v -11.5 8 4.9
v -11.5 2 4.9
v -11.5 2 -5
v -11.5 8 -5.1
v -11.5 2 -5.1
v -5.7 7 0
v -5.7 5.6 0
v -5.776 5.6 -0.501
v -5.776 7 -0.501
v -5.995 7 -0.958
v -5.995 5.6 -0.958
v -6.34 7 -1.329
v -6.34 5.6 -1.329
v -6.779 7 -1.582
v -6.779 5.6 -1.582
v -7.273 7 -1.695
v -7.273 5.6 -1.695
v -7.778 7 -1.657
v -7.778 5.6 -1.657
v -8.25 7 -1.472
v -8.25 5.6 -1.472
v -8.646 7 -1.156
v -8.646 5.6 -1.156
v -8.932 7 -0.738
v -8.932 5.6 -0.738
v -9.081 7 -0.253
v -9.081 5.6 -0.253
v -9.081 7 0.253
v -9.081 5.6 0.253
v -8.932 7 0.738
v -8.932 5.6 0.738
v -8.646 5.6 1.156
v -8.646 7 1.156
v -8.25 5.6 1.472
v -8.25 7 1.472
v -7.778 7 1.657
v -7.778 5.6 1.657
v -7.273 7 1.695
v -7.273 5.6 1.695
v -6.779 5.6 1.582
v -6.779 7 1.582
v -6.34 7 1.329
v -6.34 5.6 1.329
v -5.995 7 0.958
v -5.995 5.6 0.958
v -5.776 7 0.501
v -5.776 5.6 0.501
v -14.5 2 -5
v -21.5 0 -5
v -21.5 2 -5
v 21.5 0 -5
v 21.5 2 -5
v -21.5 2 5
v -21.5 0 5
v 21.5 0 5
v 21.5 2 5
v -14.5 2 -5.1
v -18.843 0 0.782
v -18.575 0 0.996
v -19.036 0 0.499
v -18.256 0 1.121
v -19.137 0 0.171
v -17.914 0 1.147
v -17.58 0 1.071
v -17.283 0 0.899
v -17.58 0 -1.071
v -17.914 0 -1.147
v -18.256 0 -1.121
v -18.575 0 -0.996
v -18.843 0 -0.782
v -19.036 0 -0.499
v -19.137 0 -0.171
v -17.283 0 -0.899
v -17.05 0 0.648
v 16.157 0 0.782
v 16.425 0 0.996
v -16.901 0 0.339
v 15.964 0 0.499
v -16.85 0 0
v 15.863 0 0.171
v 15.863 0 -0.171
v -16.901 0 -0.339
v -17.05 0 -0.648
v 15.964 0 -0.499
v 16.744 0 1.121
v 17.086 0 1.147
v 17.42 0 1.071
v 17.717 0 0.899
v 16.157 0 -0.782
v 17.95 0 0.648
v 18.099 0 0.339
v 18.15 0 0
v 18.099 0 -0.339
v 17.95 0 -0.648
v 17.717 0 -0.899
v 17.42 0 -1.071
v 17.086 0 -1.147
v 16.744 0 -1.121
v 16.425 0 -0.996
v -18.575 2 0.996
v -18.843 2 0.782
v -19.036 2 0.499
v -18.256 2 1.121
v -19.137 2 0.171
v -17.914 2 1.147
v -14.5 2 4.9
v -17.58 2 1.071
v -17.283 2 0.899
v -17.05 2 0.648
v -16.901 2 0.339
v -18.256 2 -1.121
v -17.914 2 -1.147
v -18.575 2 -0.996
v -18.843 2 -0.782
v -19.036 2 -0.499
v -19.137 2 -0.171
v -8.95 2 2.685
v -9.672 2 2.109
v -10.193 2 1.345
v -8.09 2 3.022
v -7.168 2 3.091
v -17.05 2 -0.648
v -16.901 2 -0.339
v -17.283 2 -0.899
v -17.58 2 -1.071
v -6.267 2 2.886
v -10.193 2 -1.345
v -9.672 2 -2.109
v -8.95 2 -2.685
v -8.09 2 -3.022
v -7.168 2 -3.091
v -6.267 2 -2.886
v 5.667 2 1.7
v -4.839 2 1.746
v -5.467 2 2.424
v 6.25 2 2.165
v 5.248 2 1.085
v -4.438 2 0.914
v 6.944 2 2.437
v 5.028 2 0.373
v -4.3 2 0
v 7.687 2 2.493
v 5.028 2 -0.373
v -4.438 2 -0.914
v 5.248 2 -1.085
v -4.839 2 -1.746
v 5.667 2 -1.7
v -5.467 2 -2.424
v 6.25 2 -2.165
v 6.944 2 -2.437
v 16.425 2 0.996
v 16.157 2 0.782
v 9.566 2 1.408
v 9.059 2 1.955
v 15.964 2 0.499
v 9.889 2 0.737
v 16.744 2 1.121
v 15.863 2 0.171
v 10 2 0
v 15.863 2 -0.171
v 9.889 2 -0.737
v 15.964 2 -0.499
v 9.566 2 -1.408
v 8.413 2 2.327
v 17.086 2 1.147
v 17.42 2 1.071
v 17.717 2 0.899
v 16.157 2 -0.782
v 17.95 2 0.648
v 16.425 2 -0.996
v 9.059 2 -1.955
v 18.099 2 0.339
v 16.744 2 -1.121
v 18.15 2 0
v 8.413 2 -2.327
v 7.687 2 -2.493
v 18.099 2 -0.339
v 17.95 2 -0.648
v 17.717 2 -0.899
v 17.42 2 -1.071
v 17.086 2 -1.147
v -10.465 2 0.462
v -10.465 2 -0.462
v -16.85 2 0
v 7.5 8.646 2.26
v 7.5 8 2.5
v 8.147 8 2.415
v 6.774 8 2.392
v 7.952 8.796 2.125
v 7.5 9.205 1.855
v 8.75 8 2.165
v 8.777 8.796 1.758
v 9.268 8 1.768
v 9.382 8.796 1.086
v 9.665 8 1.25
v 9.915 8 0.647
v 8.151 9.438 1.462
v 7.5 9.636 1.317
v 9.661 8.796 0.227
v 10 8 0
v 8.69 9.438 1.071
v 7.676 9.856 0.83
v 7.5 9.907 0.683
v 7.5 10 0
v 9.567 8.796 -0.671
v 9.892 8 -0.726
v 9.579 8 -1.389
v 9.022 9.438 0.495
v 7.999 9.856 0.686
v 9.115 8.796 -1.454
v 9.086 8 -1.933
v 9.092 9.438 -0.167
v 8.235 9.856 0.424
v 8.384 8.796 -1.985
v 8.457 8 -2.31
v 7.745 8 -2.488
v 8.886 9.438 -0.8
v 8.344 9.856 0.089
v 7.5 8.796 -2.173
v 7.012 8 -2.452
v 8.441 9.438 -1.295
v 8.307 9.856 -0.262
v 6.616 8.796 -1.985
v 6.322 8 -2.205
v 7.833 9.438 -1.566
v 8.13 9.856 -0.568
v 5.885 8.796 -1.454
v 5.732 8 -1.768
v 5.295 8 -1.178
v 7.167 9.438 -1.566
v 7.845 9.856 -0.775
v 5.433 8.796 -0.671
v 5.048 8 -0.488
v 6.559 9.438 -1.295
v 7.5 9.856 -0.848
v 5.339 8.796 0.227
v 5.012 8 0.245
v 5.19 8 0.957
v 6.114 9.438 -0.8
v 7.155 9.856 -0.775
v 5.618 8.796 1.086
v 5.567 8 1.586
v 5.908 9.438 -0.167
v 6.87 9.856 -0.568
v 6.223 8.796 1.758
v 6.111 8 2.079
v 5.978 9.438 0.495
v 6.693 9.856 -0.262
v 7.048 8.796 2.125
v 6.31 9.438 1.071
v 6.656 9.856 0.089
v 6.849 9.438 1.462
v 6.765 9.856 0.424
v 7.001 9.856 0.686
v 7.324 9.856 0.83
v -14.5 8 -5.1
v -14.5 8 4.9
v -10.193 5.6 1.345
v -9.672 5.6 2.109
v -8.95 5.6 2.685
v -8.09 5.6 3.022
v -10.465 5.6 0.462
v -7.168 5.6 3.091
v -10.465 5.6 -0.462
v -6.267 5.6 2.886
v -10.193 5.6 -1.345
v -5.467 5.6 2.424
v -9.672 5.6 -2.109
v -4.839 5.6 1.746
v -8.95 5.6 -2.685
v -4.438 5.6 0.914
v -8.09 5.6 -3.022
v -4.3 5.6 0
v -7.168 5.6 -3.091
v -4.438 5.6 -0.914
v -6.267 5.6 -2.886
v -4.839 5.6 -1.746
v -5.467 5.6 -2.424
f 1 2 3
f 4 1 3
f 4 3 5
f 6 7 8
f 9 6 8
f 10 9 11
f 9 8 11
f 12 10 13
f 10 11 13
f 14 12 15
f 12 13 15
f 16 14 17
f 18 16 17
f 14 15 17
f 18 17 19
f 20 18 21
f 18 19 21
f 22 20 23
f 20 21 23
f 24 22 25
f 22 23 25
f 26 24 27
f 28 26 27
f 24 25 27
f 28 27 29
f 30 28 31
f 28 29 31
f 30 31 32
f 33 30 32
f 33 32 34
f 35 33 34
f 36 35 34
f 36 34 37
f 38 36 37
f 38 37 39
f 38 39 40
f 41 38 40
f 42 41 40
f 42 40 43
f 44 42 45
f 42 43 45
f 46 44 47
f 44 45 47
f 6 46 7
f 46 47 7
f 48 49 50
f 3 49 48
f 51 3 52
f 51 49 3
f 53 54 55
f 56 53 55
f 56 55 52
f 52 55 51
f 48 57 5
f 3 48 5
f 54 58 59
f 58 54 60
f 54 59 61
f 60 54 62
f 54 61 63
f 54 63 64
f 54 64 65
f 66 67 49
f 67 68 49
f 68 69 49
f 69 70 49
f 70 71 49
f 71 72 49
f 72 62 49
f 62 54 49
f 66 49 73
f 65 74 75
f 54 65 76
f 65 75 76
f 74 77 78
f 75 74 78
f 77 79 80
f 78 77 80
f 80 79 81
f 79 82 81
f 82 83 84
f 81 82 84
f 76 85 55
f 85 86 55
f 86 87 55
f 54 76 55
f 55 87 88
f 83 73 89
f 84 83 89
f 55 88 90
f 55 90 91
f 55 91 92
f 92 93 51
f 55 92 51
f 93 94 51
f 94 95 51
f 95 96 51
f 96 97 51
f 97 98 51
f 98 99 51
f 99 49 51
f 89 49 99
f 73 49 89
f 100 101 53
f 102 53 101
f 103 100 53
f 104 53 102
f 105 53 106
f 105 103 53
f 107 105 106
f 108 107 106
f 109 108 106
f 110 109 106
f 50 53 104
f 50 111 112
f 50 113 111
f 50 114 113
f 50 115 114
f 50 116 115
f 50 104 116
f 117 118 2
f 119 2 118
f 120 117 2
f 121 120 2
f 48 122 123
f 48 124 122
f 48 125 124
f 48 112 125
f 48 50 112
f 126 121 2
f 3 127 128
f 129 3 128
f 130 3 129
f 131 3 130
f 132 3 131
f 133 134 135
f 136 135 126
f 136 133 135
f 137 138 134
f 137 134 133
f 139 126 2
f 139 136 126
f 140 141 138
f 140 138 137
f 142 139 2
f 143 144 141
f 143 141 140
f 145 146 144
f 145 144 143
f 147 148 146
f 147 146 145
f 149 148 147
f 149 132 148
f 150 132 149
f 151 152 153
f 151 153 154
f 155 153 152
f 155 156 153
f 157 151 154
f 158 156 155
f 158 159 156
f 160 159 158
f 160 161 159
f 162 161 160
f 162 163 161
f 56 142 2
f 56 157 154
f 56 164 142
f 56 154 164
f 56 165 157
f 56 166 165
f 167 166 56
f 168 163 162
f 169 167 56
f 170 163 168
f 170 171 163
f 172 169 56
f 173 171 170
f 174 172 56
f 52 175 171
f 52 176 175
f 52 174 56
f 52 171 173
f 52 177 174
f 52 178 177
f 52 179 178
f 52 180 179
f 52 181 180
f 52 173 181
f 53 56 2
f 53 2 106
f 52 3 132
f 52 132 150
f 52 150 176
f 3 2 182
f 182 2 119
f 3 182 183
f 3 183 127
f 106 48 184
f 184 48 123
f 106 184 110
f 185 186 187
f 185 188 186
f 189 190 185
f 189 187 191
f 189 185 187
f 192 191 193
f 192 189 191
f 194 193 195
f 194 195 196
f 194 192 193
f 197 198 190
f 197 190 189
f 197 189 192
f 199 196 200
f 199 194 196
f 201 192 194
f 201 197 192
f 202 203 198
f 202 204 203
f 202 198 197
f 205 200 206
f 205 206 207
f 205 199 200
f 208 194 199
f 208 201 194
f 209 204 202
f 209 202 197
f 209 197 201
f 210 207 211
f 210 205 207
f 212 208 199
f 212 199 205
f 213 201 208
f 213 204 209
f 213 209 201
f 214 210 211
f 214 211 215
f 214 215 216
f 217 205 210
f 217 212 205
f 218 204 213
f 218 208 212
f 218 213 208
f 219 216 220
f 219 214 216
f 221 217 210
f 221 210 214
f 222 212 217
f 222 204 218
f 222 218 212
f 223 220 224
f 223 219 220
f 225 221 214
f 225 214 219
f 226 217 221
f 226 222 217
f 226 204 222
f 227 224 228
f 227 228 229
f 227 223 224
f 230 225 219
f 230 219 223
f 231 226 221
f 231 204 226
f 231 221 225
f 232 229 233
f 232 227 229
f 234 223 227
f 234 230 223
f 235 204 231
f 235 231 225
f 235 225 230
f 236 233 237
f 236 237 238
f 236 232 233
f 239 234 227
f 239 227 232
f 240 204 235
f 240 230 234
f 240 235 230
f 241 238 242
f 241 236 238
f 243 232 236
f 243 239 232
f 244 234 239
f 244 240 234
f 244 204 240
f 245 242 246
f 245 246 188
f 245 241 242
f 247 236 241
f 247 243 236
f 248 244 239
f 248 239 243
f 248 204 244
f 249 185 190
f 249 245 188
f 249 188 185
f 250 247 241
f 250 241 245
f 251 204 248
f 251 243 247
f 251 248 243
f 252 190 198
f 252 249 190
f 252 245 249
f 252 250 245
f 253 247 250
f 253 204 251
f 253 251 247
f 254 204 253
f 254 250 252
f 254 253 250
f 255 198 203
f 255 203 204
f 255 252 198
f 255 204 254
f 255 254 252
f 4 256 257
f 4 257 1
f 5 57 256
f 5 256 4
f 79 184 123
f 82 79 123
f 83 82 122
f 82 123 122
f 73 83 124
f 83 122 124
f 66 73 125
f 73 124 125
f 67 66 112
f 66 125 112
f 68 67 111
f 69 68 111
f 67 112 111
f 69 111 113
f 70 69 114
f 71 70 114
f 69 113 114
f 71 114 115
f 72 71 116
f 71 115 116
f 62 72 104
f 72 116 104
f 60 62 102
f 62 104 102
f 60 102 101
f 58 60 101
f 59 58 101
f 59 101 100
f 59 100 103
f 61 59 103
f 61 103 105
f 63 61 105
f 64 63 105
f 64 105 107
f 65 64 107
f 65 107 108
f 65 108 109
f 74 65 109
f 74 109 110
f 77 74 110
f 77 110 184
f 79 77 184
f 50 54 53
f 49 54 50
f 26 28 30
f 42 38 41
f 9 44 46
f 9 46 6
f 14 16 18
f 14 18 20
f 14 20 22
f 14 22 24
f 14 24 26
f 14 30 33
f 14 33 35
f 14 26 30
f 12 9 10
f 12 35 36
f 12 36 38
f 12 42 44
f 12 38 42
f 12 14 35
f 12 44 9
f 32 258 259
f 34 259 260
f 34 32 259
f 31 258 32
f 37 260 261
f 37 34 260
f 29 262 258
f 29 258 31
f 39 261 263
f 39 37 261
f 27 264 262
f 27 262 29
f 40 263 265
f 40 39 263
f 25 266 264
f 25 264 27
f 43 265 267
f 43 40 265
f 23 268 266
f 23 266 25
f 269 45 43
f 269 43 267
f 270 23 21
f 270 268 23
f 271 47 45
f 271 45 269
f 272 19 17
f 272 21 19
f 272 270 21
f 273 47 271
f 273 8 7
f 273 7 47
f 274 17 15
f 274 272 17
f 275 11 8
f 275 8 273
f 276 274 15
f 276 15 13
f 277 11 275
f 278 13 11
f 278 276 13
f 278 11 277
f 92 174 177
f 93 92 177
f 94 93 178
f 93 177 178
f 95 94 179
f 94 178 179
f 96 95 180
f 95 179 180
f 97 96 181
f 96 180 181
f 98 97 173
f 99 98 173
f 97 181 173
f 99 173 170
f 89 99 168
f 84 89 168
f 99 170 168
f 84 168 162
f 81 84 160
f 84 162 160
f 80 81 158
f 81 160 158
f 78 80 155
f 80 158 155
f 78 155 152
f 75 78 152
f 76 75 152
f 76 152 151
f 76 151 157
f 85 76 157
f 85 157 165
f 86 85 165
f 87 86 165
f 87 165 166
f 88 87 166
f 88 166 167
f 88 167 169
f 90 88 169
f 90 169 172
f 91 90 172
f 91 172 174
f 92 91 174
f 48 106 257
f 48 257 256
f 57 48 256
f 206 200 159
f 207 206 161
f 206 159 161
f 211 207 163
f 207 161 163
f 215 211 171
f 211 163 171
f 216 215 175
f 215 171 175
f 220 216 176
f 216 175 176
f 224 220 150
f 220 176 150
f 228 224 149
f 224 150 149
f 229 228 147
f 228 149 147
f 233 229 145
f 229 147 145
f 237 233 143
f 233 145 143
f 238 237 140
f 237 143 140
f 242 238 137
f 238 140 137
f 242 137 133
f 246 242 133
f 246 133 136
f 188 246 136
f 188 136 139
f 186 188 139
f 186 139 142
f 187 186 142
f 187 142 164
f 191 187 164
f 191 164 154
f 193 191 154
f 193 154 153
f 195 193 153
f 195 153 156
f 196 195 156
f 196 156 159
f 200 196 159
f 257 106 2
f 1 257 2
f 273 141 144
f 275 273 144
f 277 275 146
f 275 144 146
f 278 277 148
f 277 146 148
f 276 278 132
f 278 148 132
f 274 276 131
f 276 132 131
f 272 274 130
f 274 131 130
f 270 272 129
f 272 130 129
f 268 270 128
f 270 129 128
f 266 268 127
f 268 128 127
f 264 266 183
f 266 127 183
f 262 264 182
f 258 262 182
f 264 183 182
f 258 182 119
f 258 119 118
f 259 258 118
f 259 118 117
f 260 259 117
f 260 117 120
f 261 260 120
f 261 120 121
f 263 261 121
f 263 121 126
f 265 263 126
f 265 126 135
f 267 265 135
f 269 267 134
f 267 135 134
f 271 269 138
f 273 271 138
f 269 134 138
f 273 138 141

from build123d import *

# Parameters (mm, degrees)
SKETCH1_W               = 43
SKETCH1_H               = 10
BOSS_EXTRUDE1_DEPTH     = 2
SKETCH2_W               = 3
SKETCH2_H               = 10
BOSS_EXTRUDE2_DEPTH     = 6
SKETCH4_R               = 3.1
BOSS_EXTRUDE3_DEPTH     = 3.6
SKETCH6_R               = 1.7
BOSS_EXTRUDE5_DEPTH     = 1.4
SKETCH7_R               = 2.5
BOSS_EXTRUDE6_DEPTH     = 6
DOME1_FACE_RADIUS       = 2.5
DOME1_HEIGHT            = 2
SKETCH8_R               = 1.15
CUT_EXTRUDE1_DEPTH      = 9
CUT_EXTRUDE1_DEPTH_BACK = 3


with BuildPart() as part:
    # Sketch1 → Boss-Extrude1 (new body)
    with BuildSketch(Plane(origin=(0, 0, 0), x_dir=(1, 0, 0), z_dir=(0, 1, 0))):
        Rectangle(SKETCH1_W, SKETCH1_H)
    extrude(amount=BOSS_EXTRUDE1_DEPTH)

    # Sketch2 → Boss-Extrude2 (add)
    with BuildSketch(Plane(origin=(0, 2, 0), x_dir=(1, 0, 0), z_dir=(0, 1, 0))):
        with Locations((-13, 0.1)):
            Rectangle(SKETCH2_W, SKETCH2_H)
    extrude(amount=BOSS_EXTRUDE2_DEPTH)

    # Sketch4 → Boss-Extrude3 (add)
    with BuildSketch(Plane(origin=(0, 2, 0), x_dir=(1, 0, 0), z_dir=(0, 1, 0))):
        with Locations((-7.4, 0)):
            Circle(SKETCH4_R)
    extrude(amount=BOSS_EXTRUDE3_DEPTH)

    # Sketch6 → Boss-Extrude5 (add)
    with BuildSketch(Plane(origin=(0, 5.6, 0), x_dir=(1, 0, 0), z_dir=(0, 1, 0))):
        with Locations((-7.4, 0)):
            Circle(SKETCH6_R)
    extrude(amount=BOSS_EXTRUDE5_DEPTH)

    # Sketch7 → Boss-Extrude6 (add)
    with BuildSketch(Plane(origin=(0, 2, 0), x_dir=(1, 0, 0), z_dir=(0, 1, 0))):
        with Locations((7.5, 0)):
            Circle(SKETCH7_R)
    extrude(amount=BOSS_EXTRUDE6_DEPTH)

    # Dome1: a dome of height H over a round flat face of radius A is a cap of a sphere of radius (A * A + H * H) / (2 * H)
    dome1_r = (DOME1_FACE_RADIUS * DOME1_FACE_RADIUS + DOME1_HEIGHT * DOME1_HEIGHT) / (2 * DOME1_HEIGHT)
    dome1_base = Plane((7.5, 8, 0), z_dir=(0, 1, 0))
    with Locations(dome1_base.offset(DOME1_HEIGHT - dome1_r)):
        dome1_ball = Sphere(dome1_r, mode=Mode.PRIVATE)
    add(split(dome1_ball, bisect_by=dome1_base, keep=Keep.TOP, mode=Mode.PRIVATE))

    # Sketch8 → Cut-Extrude1 (cut, two sides)
    with BuildSketch(Plane(origin=(0, 2, 0), x_dir=(1, 0, 0), z_dir=(0, 1, 0))) as cut_extrude1_sk:
        with Locations((-18, 0)):
            Circle(SKETCH8_R)
        with Locations((17, 0)):
            Circle(SKETCH8_R)
    extrude(amount=CUT_EXTRUDE1_DEPTH, mode=Mode.SUBTRACT)
    extrude(cut_extrude1_sk.sketch, amount=-CUT_EXTRUDE1_DEPTH_BACK, mode=Mode.SUBTRACT)


solid = part.part
